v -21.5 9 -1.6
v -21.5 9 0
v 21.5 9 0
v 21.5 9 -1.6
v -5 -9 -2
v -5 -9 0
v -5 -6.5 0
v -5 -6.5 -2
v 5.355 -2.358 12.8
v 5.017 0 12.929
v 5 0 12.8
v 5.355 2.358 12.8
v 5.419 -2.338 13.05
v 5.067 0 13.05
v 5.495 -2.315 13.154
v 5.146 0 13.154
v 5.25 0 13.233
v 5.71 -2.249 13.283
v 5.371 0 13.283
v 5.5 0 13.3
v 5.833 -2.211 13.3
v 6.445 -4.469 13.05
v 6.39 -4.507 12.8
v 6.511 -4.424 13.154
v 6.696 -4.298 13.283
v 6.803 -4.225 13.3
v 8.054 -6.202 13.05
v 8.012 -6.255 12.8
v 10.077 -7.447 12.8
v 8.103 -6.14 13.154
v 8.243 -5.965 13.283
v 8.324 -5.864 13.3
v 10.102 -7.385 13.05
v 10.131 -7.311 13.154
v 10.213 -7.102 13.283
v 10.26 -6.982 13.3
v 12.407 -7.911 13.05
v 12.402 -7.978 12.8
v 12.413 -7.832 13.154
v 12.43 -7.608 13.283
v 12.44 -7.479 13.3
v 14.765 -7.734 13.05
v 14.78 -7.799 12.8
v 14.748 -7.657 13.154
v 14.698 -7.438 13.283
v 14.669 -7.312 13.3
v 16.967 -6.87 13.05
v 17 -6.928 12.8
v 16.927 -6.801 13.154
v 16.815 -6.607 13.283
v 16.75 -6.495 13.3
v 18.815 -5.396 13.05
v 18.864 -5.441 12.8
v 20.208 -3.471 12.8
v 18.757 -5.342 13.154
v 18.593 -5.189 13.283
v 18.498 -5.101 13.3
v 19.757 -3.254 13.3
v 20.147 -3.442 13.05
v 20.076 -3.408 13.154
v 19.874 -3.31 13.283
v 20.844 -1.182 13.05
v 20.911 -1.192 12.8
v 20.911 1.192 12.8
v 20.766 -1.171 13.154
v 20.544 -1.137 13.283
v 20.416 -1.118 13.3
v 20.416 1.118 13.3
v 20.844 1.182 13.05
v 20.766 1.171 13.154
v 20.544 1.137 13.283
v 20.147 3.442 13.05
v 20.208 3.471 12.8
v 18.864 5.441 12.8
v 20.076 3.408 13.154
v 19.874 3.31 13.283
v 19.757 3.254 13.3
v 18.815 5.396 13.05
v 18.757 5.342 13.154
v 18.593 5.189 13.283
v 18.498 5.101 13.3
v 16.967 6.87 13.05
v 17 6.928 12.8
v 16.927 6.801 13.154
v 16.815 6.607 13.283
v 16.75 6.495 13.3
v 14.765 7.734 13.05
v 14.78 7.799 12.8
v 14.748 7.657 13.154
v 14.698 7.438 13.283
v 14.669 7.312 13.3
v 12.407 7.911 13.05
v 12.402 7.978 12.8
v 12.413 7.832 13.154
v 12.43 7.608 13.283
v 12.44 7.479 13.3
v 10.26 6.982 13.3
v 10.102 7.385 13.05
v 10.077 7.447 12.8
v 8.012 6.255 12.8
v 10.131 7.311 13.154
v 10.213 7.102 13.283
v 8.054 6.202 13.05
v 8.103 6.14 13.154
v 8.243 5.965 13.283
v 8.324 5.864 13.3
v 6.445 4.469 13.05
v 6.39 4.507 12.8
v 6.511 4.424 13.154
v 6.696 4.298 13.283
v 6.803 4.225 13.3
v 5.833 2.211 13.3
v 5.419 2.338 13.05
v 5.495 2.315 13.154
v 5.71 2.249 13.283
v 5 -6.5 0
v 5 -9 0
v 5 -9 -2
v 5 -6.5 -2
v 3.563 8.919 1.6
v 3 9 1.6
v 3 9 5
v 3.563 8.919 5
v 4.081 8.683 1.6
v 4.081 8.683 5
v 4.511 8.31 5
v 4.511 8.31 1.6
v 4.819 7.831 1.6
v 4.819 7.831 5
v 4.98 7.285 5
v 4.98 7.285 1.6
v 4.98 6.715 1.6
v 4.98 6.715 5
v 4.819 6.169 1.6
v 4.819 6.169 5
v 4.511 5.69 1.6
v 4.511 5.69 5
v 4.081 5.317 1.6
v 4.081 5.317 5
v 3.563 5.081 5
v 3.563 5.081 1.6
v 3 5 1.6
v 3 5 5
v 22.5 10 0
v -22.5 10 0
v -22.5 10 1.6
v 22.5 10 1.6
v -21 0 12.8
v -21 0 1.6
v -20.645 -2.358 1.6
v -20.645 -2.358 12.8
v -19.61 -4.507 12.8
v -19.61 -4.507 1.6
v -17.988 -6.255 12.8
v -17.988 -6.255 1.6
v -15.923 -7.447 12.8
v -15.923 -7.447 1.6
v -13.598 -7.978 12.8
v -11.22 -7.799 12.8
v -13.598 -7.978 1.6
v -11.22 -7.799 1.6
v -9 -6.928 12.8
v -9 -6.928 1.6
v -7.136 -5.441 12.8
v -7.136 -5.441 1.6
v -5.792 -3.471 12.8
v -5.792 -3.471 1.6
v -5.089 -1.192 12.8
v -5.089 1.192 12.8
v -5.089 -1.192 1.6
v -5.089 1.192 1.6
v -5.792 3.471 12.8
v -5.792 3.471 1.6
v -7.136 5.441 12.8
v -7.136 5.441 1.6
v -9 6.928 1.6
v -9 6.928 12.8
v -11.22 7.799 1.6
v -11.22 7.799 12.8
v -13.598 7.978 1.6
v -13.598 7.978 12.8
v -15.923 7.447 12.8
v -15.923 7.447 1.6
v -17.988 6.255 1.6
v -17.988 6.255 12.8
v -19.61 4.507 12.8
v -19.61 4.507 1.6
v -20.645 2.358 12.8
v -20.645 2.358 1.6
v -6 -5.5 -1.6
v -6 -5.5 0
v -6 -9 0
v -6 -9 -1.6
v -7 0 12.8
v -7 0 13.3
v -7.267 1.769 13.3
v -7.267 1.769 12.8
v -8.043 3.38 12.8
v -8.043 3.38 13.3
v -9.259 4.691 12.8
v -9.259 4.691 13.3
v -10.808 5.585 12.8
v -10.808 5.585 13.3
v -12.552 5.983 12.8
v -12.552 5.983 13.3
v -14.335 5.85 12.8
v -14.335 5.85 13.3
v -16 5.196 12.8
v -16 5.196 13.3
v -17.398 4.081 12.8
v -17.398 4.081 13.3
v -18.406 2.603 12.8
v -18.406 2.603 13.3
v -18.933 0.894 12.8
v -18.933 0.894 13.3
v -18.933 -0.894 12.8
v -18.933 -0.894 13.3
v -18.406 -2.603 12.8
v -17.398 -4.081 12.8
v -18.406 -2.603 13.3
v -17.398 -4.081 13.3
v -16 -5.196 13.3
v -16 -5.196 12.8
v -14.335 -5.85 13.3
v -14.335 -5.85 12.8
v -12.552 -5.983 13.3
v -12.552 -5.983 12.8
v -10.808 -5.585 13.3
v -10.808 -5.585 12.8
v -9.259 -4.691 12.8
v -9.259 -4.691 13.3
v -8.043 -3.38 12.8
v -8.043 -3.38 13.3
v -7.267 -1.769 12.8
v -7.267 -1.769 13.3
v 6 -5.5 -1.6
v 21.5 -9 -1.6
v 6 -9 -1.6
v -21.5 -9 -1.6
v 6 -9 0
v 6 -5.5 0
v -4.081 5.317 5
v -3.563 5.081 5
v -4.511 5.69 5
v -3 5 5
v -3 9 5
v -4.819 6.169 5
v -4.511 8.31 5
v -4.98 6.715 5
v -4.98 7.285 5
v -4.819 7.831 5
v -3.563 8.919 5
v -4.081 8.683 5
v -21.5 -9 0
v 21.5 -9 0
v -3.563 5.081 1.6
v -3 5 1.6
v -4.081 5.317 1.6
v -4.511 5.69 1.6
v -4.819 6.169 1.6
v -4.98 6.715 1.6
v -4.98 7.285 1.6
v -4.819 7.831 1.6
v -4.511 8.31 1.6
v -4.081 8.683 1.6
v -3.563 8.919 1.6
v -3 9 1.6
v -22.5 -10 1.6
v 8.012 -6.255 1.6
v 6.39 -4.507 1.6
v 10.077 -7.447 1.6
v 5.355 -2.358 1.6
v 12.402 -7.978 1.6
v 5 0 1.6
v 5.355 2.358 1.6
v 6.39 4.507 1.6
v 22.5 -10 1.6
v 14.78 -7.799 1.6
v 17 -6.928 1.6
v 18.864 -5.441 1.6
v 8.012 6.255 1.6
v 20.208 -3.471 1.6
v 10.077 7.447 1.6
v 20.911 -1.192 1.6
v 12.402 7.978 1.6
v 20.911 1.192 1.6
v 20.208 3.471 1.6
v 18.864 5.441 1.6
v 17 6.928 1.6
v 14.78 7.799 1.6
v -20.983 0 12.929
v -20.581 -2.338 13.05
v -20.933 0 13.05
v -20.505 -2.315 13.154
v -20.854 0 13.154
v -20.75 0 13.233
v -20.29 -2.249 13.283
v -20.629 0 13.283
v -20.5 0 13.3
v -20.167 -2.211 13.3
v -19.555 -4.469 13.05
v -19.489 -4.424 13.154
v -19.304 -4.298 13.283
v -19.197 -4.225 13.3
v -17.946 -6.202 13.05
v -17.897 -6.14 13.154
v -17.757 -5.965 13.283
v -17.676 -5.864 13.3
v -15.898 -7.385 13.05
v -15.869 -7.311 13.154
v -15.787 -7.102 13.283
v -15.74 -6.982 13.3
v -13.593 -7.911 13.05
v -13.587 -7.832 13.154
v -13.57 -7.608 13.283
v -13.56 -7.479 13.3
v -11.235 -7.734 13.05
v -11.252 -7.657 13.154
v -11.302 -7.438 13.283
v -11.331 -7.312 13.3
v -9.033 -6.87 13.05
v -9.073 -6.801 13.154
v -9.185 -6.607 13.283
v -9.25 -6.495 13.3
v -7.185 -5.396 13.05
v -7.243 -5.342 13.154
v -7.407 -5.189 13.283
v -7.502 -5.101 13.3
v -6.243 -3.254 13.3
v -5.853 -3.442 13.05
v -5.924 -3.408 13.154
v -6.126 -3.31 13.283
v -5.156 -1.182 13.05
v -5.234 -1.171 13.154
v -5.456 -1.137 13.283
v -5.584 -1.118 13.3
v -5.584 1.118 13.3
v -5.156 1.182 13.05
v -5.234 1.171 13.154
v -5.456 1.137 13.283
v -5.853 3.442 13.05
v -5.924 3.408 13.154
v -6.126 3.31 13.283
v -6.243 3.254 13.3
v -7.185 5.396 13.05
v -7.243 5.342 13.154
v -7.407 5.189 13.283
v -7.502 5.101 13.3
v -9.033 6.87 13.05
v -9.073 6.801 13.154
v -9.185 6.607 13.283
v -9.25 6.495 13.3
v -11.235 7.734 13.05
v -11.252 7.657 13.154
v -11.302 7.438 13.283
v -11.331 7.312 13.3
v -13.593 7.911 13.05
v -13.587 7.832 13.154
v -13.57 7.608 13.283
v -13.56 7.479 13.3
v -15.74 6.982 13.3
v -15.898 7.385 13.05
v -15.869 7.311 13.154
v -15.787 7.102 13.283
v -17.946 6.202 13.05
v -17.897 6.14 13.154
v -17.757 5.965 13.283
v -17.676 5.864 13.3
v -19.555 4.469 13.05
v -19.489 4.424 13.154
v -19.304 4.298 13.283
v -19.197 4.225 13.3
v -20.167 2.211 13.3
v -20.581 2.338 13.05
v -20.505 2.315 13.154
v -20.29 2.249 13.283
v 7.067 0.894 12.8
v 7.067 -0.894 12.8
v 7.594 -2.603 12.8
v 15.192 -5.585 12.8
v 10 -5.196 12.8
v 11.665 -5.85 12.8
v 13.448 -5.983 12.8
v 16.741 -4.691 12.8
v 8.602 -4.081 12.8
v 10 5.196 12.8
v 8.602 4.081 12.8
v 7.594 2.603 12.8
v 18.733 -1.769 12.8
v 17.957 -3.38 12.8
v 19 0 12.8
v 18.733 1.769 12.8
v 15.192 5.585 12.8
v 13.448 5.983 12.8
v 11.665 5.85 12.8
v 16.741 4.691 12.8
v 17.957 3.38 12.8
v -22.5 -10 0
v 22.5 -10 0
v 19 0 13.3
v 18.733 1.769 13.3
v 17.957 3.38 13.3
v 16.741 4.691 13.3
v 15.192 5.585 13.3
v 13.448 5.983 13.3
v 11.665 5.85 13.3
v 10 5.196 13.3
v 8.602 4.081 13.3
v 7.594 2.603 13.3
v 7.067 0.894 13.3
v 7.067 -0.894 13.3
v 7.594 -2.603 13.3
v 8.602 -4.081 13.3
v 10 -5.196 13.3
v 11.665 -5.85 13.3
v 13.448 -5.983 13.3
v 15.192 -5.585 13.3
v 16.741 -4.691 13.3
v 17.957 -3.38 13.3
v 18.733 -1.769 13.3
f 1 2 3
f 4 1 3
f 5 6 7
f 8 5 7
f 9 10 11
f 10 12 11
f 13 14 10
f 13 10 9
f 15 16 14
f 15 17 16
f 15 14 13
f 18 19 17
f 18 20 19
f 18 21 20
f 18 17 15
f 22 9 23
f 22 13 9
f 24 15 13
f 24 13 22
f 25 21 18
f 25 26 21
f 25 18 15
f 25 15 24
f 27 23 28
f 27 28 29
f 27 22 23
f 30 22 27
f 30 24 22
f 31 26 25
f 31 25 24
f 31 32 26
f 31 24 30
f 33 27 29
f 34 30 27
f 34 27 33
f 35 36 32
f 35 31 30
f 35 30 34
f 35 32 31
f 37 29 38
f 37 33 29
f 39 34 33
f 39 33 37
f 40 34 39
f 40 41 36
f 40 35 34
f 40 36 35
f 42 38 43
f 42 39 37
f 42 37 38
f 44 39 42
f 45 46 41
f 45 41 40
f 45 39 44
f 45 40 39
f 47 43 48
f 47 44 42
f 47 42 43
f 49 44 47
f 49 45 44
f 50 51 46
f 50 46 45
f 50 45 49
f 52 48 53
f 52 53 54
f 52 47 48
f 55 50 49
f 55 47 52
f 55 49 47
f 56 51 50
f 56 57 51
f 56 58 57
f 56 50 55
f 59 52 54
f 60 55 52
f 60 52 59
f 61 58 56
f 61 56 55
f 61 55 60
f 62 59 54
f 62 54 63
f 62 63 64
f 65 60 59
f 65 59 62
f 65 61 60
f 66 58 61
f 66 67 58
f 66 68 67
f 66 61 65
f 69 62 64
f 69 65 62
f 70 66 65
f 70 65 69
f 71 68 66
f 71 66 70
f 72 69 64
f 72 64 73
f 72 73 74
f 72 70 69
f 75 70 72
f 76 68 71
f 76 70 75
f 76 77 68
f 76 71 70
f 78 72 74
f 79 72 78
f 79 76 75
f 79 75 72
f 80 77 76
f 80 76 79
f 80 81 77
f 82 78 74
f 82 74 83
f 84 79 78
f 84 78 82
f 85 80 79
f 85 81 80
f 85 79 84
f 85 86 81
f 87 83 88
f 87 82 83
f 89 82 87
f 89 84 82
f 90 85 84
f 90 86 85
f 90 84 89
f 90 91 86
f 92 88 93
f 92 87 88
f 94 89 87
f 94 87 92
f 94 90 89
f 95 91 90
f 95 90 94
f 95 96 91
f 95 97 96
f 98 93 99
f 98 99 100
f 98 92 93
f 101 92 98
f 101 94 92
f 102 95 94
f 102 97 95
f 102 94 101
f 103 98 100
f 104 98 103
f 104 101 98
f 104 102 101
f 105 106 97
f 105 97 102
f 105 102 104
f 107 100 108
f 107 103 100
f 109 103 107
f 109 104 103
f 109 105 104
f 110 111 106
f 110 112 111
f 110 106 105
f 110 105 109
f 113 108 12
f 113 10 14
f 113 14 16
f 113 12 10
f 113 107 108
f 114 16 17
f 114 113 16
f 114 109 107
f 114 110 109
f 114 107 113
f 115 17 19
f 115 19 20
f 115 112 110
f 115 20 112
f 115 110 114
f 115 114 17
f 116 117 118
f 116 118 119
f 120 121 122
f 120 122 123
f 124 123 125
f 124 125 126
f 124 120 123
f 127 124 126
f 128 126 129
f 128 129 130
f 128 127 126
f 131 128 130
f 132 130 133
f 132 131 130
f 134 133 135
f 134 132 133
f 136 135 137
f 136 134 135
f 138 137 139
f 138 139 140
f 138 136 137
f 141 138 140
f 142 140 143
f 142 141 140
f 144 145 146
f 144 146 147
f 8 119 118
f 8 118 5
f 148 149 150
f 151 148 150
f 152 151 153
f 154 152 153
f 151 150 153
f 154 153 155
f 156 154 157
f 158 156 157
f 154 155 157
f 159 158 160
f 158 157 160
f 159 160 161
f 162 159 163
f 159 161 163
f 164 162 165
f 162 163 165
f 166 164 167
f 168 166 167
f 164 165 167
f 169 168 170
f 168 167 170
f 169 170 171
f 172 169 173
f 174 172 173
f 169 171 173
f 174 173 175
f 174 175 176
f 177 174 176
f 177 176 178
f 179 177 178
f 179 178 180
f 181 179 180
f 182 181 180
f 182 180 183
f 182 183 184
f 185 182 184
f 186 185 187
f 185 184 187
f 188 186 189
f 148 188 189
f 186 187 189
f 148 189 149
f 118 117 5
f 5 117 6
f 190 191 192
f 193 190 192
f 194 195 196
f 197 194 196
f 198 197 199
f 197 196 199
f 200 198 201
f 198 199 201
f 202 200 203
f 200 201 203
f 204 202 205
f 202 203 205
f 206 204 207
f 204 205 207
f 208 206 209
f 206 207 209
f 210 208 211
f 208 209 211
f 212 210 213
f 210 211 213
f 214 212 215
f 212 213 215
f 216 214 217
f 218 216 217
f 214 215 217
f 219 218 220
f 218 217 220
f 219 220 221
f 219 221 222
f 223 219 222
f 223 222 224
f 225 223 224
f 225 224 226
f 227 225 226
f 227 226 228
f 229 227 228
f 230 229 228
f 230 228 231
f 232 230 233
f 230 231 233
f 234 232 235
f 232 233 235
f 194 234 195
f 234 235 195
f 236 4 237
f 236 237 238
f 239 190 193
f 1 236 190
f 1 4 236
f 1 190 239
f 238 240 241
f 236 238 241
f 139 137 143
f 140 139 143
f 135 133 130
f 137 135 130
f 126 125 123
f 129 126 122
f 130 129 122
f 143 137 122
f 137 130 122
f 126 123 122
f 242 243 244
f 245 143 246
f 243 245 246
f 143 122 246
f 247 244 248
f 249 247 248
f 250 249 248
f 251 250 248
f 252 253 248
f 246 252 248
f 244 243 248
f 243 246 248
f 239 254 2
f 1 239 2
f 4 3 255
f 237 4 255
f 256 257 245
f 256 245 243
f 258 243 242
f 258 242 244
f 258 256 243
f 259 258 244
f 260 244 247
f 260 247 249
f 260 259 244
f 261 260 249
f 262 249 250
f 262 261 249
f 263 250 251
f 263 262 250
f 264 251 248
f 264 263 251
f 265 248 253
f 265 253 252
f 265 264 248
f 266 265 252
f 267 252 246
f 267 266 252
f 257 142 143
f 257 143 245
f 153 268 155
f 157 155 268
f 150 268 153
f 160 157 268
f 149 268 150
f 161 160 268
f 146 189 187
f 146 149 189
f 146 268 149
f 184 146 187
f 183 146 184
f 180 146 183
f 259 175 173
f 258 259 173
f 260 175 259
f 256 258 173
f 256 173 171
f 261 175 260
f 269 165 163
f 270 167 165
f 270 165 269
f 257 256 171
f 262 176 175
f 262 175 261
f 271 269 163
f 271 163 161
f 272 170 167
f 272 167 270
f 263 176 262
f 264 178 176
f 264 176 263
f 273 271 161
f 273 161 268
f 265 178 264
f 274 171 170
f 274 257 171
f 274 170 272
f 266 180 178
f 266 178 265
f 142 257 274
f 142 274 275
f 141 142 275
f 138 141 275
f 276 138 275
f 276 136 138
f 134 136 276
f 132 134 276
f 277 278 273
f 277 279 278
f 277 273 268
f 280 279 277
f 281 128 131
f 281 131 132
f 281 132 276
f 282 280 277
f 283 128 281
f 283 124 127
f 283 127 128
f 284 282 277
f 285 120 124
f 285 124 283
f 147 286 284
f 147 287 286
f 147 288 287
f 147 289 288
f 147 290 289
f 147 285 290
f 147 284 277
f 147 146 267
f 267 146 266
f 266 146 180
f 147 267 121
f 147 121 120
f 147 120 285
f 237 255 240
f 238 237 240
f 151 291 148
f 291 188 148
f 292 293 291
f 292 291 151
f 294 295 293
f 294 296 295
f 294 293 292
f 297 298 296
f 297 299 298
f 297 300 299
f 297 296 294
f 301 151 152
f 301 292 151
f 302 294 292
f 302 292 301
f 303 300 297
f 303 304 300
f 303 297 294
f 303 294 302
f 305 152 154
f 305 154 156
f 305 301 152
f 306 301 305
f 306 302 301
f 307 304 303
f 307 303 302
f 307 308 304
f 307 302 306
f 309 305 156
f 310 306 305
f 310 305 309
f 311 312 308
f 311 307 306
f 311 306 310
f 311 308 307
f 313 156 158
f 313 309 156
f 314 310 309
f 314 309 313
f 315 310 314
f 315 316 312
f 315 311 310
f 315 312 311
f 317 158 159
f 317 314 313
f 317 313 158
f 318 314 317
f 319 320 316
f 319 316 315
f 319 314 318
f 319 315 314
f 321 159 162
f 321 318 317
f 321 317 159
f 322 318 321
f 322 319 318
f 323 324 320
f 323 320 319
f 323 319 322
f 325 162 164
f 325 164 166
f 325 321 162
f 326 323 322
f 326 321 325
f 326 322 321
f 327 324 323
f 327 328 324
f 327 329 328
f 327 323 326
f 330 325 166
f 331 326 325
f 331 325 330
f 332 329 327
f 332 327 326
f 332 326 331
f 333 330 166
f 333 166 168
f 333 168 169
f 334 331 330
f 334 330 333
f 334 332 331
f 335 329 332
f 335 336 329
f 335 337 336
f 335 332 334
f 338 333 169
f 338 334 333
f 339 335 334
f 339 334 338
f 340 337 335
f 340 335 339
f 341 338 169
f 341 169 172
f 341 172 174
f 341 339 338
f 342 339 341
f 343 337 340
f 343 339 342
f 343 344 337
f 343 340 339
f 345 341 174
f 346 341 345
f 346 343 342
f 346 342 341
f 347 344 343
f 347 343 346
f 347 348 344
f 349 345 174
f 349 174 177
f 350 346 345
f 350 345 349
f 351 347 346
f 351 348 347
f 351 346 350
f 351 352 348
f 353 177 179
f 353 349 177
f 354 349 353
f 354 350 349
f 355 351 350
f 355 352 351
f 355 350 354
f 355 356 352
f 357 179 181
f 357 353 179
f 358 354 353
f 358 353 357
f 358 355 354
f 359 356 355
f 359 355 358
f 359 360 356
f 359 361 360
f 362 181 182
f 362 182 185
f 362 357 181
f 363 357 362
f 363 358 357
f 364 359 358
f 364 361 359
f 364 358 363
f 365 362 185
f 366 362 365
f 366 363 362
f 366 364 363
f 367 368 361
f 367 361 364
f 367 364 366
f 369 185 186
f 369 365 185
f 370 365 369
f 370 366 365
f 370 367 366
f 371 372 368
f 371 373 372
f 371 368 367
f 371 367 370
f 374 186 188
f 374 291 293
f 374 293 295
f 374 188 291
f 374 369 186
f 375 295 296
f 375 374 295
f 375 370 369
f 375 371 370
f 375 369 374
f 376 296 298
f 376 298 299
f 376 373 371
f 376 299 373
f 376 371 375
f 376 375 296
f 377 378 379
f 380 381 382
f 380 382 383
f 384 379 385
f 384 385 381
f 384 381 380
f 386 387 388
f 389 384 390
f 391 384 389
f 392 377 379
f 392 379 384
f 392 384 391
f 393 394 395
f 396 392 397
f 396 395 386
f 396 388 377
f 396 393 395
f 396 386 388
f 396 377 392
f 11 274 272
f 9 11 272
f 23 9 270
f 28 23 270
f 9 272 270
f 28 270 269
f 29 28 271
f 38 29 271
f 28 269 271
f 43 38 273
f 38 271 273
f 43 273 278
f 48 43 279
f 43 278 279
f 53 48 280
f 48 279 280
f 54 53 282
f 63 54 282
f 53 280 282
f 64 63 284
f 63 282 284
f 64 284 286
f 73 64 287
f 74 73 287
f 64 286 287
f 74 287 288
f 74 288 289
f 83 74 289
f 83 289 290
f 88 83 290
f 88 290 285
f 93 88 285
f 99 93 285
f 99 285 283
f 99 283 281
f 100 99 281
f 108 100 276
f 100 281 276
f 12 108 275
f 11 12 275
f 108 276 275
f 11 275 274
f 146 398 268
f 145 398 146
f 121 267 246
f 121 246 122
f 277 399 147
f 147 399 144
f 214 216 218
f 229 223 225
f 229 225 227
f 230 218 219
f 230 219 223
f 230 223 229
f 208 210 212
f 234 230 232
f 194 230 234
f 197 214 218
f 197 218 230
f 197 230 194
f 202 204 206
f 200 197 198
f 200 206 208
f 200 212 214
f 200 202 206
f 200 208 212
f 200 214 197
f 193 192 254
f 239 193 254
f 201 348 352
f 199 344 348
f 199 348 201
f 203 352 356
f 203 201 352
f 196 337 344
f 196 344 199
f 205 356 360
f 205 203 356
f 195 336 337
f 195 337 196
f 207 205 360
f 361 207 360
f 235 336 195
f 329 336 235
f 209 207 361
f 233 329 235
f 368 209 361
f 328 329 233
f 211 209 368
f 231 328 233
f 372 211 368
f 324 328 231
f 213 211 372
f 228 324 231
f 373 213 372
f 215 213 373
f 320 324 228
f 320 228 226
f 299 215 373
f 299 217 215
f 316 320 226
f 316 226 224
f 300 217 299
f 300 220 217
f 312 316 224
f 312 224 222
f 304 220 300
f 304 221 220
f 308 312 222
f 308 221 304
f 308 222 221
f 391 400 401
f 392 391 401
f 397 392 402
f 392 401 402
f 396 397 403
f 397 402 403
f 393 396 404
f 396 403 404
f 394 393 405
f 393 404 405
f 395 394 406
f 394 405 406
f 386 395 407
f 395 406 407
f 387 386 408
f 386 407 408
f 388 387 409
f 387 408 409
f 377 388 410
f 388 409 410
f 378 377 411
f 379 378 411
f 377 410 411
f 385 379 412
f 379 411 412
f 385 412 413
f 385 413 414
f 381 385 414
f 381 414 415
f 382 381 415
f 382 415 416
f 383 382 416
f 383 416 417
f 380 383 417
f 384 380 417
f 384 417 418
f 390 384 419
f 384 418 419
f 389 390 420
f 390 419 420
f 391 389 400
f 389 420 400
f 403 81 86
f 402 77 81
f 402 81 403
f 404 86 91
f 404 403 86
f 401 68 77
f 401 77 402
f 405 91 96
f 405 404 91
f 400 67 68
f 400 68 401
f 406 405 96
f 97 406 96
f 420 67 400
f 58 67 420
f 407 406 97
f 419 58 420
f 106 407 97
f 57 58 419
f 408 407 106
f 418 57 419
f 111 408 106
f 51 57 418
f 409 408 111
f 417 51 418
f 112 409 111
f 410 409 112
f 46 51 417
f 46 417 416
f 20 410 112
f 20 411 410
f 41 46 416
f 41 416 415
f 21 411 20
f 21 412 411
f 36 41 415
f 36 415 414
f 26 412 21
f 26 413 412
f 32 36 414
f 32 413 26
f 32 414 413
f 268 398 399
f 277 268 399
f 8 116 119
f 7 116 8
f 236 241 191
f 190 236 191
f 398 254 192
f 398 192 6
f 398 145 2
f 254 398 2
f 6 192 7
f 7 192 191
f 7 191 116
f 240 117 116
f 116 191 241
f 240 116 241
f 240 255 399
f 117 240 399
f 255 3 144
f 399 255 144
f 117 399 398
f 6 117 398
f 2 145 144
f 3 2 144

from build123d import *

# Parameters (mm, degrees)
SKETCH_1_W          = 45
SKETCH_1_H          = 20
EXTRUDE_1_DEPTH     = 1.6
SKETCH_2_R          = 8
EXTRUDE_2_DEPTH     = 11.7
FILLET_1_R          = 0.5
SKETCH_3_R          = 6
CUT_EXTRUDE_1_DEPTH = 0.5
EXTRUDE_3_DEPTH     = 3.4
SKETCH_5_W          = 10
SKETCH_5_H          = 2.5
EXTRUDE_4_DEPTH     = 2
EXTRUDE_5_DEPTH     = 1.6


with BuildPart() as part:
    # Эскиз1 → Бобышка-Вытянуть1 (new body)
    with BuildSketch(Plane.XY):
        Rectangle(SKETCH_1_W, SKETCH_1_H)
    extrude(amount=EXTRUDE_1_DEPTH)

    # Эскиз2 → Бобышка-Вытянуть2 (add)
    with BuildSketch(Plane.XY.offset(1.6)):
        with Locations(Location((-13, 0, 0), (0, 0, 180))):
            Circle(SKETCH_2_R)
        with Locations(Location((13, 0, 0), (0, 0, 180))):
            Circle(SKETCH_2_R)
    extrude(amount=EXTRUDE_2_DEPTH)

    # Скругление1
    fillet_1_edges = [part.edges().sort_by_distance(p)[0] for p in [
        (-5, 0, 13.3),
        (21, 0, 13.3),
    ]]
    fillet(fillet_1_edges, radius=FILLET_1_R)

    # Эскиз3 → Вырез-Вытянуть1 (cut)
    with BuildSketch(Plane.XY.offset(13.3)):
        with Locations((-13, 0)):
            Circle(SKETCH_3_R)
        with Locations((13, 0)):
            Circle(SKETCH_3_R)
    extrude(amount=-CUT_EXTRUDE_1_DEPTH, mode=Mode.SUBTRACT)

    # Эскиз4 → Бобышка-Вытянуть3 (add)
    with BuildSketch(Plane.XY.offset(1.6)):
        with BuildLine():
            Line((-3, 9), (3, 9))
            ThreePointArc((3, 9), (5, 7), (3, 5))
            Line((3, 5), (-3, 5))
            ThreePointArc((-3, 5), (-5, 7), (-3, 9))
        make_face()
    extrude(amount=EXTRUDE_3_DEPTH)

    # Эскиз5 → Бобышка-Вытянуть4 (add)
    with BuildSketch(Plane(origin=(0, 0, 0), x_dir=(-1, 0, 0), z_dir=(0, 0, -1))):
        with Locations((0, -7.75)):
            Rectangle(SKETCH_5_W, SKETCH_5_H)
    extrude(amount=EXTRUDE_4_DEPTH)

    # Эскиз8 → Бобышка-Вытянуть5 (add)
    with BuildSketch(Plane(origin=(0, 0, 0), x_dir=(-1, 0, 0), z_dir=(0, 0, -1))):
        Polygon((-6, -9), (-6, -5.5), (6, -5.5), (6, -9), (21.5, -9), (21.5, 9), (-21.5, 9), (-21.5, -9), align=None)
    extrude(amount=EXTRUDE_5_DEPTH)


solid = part.part
